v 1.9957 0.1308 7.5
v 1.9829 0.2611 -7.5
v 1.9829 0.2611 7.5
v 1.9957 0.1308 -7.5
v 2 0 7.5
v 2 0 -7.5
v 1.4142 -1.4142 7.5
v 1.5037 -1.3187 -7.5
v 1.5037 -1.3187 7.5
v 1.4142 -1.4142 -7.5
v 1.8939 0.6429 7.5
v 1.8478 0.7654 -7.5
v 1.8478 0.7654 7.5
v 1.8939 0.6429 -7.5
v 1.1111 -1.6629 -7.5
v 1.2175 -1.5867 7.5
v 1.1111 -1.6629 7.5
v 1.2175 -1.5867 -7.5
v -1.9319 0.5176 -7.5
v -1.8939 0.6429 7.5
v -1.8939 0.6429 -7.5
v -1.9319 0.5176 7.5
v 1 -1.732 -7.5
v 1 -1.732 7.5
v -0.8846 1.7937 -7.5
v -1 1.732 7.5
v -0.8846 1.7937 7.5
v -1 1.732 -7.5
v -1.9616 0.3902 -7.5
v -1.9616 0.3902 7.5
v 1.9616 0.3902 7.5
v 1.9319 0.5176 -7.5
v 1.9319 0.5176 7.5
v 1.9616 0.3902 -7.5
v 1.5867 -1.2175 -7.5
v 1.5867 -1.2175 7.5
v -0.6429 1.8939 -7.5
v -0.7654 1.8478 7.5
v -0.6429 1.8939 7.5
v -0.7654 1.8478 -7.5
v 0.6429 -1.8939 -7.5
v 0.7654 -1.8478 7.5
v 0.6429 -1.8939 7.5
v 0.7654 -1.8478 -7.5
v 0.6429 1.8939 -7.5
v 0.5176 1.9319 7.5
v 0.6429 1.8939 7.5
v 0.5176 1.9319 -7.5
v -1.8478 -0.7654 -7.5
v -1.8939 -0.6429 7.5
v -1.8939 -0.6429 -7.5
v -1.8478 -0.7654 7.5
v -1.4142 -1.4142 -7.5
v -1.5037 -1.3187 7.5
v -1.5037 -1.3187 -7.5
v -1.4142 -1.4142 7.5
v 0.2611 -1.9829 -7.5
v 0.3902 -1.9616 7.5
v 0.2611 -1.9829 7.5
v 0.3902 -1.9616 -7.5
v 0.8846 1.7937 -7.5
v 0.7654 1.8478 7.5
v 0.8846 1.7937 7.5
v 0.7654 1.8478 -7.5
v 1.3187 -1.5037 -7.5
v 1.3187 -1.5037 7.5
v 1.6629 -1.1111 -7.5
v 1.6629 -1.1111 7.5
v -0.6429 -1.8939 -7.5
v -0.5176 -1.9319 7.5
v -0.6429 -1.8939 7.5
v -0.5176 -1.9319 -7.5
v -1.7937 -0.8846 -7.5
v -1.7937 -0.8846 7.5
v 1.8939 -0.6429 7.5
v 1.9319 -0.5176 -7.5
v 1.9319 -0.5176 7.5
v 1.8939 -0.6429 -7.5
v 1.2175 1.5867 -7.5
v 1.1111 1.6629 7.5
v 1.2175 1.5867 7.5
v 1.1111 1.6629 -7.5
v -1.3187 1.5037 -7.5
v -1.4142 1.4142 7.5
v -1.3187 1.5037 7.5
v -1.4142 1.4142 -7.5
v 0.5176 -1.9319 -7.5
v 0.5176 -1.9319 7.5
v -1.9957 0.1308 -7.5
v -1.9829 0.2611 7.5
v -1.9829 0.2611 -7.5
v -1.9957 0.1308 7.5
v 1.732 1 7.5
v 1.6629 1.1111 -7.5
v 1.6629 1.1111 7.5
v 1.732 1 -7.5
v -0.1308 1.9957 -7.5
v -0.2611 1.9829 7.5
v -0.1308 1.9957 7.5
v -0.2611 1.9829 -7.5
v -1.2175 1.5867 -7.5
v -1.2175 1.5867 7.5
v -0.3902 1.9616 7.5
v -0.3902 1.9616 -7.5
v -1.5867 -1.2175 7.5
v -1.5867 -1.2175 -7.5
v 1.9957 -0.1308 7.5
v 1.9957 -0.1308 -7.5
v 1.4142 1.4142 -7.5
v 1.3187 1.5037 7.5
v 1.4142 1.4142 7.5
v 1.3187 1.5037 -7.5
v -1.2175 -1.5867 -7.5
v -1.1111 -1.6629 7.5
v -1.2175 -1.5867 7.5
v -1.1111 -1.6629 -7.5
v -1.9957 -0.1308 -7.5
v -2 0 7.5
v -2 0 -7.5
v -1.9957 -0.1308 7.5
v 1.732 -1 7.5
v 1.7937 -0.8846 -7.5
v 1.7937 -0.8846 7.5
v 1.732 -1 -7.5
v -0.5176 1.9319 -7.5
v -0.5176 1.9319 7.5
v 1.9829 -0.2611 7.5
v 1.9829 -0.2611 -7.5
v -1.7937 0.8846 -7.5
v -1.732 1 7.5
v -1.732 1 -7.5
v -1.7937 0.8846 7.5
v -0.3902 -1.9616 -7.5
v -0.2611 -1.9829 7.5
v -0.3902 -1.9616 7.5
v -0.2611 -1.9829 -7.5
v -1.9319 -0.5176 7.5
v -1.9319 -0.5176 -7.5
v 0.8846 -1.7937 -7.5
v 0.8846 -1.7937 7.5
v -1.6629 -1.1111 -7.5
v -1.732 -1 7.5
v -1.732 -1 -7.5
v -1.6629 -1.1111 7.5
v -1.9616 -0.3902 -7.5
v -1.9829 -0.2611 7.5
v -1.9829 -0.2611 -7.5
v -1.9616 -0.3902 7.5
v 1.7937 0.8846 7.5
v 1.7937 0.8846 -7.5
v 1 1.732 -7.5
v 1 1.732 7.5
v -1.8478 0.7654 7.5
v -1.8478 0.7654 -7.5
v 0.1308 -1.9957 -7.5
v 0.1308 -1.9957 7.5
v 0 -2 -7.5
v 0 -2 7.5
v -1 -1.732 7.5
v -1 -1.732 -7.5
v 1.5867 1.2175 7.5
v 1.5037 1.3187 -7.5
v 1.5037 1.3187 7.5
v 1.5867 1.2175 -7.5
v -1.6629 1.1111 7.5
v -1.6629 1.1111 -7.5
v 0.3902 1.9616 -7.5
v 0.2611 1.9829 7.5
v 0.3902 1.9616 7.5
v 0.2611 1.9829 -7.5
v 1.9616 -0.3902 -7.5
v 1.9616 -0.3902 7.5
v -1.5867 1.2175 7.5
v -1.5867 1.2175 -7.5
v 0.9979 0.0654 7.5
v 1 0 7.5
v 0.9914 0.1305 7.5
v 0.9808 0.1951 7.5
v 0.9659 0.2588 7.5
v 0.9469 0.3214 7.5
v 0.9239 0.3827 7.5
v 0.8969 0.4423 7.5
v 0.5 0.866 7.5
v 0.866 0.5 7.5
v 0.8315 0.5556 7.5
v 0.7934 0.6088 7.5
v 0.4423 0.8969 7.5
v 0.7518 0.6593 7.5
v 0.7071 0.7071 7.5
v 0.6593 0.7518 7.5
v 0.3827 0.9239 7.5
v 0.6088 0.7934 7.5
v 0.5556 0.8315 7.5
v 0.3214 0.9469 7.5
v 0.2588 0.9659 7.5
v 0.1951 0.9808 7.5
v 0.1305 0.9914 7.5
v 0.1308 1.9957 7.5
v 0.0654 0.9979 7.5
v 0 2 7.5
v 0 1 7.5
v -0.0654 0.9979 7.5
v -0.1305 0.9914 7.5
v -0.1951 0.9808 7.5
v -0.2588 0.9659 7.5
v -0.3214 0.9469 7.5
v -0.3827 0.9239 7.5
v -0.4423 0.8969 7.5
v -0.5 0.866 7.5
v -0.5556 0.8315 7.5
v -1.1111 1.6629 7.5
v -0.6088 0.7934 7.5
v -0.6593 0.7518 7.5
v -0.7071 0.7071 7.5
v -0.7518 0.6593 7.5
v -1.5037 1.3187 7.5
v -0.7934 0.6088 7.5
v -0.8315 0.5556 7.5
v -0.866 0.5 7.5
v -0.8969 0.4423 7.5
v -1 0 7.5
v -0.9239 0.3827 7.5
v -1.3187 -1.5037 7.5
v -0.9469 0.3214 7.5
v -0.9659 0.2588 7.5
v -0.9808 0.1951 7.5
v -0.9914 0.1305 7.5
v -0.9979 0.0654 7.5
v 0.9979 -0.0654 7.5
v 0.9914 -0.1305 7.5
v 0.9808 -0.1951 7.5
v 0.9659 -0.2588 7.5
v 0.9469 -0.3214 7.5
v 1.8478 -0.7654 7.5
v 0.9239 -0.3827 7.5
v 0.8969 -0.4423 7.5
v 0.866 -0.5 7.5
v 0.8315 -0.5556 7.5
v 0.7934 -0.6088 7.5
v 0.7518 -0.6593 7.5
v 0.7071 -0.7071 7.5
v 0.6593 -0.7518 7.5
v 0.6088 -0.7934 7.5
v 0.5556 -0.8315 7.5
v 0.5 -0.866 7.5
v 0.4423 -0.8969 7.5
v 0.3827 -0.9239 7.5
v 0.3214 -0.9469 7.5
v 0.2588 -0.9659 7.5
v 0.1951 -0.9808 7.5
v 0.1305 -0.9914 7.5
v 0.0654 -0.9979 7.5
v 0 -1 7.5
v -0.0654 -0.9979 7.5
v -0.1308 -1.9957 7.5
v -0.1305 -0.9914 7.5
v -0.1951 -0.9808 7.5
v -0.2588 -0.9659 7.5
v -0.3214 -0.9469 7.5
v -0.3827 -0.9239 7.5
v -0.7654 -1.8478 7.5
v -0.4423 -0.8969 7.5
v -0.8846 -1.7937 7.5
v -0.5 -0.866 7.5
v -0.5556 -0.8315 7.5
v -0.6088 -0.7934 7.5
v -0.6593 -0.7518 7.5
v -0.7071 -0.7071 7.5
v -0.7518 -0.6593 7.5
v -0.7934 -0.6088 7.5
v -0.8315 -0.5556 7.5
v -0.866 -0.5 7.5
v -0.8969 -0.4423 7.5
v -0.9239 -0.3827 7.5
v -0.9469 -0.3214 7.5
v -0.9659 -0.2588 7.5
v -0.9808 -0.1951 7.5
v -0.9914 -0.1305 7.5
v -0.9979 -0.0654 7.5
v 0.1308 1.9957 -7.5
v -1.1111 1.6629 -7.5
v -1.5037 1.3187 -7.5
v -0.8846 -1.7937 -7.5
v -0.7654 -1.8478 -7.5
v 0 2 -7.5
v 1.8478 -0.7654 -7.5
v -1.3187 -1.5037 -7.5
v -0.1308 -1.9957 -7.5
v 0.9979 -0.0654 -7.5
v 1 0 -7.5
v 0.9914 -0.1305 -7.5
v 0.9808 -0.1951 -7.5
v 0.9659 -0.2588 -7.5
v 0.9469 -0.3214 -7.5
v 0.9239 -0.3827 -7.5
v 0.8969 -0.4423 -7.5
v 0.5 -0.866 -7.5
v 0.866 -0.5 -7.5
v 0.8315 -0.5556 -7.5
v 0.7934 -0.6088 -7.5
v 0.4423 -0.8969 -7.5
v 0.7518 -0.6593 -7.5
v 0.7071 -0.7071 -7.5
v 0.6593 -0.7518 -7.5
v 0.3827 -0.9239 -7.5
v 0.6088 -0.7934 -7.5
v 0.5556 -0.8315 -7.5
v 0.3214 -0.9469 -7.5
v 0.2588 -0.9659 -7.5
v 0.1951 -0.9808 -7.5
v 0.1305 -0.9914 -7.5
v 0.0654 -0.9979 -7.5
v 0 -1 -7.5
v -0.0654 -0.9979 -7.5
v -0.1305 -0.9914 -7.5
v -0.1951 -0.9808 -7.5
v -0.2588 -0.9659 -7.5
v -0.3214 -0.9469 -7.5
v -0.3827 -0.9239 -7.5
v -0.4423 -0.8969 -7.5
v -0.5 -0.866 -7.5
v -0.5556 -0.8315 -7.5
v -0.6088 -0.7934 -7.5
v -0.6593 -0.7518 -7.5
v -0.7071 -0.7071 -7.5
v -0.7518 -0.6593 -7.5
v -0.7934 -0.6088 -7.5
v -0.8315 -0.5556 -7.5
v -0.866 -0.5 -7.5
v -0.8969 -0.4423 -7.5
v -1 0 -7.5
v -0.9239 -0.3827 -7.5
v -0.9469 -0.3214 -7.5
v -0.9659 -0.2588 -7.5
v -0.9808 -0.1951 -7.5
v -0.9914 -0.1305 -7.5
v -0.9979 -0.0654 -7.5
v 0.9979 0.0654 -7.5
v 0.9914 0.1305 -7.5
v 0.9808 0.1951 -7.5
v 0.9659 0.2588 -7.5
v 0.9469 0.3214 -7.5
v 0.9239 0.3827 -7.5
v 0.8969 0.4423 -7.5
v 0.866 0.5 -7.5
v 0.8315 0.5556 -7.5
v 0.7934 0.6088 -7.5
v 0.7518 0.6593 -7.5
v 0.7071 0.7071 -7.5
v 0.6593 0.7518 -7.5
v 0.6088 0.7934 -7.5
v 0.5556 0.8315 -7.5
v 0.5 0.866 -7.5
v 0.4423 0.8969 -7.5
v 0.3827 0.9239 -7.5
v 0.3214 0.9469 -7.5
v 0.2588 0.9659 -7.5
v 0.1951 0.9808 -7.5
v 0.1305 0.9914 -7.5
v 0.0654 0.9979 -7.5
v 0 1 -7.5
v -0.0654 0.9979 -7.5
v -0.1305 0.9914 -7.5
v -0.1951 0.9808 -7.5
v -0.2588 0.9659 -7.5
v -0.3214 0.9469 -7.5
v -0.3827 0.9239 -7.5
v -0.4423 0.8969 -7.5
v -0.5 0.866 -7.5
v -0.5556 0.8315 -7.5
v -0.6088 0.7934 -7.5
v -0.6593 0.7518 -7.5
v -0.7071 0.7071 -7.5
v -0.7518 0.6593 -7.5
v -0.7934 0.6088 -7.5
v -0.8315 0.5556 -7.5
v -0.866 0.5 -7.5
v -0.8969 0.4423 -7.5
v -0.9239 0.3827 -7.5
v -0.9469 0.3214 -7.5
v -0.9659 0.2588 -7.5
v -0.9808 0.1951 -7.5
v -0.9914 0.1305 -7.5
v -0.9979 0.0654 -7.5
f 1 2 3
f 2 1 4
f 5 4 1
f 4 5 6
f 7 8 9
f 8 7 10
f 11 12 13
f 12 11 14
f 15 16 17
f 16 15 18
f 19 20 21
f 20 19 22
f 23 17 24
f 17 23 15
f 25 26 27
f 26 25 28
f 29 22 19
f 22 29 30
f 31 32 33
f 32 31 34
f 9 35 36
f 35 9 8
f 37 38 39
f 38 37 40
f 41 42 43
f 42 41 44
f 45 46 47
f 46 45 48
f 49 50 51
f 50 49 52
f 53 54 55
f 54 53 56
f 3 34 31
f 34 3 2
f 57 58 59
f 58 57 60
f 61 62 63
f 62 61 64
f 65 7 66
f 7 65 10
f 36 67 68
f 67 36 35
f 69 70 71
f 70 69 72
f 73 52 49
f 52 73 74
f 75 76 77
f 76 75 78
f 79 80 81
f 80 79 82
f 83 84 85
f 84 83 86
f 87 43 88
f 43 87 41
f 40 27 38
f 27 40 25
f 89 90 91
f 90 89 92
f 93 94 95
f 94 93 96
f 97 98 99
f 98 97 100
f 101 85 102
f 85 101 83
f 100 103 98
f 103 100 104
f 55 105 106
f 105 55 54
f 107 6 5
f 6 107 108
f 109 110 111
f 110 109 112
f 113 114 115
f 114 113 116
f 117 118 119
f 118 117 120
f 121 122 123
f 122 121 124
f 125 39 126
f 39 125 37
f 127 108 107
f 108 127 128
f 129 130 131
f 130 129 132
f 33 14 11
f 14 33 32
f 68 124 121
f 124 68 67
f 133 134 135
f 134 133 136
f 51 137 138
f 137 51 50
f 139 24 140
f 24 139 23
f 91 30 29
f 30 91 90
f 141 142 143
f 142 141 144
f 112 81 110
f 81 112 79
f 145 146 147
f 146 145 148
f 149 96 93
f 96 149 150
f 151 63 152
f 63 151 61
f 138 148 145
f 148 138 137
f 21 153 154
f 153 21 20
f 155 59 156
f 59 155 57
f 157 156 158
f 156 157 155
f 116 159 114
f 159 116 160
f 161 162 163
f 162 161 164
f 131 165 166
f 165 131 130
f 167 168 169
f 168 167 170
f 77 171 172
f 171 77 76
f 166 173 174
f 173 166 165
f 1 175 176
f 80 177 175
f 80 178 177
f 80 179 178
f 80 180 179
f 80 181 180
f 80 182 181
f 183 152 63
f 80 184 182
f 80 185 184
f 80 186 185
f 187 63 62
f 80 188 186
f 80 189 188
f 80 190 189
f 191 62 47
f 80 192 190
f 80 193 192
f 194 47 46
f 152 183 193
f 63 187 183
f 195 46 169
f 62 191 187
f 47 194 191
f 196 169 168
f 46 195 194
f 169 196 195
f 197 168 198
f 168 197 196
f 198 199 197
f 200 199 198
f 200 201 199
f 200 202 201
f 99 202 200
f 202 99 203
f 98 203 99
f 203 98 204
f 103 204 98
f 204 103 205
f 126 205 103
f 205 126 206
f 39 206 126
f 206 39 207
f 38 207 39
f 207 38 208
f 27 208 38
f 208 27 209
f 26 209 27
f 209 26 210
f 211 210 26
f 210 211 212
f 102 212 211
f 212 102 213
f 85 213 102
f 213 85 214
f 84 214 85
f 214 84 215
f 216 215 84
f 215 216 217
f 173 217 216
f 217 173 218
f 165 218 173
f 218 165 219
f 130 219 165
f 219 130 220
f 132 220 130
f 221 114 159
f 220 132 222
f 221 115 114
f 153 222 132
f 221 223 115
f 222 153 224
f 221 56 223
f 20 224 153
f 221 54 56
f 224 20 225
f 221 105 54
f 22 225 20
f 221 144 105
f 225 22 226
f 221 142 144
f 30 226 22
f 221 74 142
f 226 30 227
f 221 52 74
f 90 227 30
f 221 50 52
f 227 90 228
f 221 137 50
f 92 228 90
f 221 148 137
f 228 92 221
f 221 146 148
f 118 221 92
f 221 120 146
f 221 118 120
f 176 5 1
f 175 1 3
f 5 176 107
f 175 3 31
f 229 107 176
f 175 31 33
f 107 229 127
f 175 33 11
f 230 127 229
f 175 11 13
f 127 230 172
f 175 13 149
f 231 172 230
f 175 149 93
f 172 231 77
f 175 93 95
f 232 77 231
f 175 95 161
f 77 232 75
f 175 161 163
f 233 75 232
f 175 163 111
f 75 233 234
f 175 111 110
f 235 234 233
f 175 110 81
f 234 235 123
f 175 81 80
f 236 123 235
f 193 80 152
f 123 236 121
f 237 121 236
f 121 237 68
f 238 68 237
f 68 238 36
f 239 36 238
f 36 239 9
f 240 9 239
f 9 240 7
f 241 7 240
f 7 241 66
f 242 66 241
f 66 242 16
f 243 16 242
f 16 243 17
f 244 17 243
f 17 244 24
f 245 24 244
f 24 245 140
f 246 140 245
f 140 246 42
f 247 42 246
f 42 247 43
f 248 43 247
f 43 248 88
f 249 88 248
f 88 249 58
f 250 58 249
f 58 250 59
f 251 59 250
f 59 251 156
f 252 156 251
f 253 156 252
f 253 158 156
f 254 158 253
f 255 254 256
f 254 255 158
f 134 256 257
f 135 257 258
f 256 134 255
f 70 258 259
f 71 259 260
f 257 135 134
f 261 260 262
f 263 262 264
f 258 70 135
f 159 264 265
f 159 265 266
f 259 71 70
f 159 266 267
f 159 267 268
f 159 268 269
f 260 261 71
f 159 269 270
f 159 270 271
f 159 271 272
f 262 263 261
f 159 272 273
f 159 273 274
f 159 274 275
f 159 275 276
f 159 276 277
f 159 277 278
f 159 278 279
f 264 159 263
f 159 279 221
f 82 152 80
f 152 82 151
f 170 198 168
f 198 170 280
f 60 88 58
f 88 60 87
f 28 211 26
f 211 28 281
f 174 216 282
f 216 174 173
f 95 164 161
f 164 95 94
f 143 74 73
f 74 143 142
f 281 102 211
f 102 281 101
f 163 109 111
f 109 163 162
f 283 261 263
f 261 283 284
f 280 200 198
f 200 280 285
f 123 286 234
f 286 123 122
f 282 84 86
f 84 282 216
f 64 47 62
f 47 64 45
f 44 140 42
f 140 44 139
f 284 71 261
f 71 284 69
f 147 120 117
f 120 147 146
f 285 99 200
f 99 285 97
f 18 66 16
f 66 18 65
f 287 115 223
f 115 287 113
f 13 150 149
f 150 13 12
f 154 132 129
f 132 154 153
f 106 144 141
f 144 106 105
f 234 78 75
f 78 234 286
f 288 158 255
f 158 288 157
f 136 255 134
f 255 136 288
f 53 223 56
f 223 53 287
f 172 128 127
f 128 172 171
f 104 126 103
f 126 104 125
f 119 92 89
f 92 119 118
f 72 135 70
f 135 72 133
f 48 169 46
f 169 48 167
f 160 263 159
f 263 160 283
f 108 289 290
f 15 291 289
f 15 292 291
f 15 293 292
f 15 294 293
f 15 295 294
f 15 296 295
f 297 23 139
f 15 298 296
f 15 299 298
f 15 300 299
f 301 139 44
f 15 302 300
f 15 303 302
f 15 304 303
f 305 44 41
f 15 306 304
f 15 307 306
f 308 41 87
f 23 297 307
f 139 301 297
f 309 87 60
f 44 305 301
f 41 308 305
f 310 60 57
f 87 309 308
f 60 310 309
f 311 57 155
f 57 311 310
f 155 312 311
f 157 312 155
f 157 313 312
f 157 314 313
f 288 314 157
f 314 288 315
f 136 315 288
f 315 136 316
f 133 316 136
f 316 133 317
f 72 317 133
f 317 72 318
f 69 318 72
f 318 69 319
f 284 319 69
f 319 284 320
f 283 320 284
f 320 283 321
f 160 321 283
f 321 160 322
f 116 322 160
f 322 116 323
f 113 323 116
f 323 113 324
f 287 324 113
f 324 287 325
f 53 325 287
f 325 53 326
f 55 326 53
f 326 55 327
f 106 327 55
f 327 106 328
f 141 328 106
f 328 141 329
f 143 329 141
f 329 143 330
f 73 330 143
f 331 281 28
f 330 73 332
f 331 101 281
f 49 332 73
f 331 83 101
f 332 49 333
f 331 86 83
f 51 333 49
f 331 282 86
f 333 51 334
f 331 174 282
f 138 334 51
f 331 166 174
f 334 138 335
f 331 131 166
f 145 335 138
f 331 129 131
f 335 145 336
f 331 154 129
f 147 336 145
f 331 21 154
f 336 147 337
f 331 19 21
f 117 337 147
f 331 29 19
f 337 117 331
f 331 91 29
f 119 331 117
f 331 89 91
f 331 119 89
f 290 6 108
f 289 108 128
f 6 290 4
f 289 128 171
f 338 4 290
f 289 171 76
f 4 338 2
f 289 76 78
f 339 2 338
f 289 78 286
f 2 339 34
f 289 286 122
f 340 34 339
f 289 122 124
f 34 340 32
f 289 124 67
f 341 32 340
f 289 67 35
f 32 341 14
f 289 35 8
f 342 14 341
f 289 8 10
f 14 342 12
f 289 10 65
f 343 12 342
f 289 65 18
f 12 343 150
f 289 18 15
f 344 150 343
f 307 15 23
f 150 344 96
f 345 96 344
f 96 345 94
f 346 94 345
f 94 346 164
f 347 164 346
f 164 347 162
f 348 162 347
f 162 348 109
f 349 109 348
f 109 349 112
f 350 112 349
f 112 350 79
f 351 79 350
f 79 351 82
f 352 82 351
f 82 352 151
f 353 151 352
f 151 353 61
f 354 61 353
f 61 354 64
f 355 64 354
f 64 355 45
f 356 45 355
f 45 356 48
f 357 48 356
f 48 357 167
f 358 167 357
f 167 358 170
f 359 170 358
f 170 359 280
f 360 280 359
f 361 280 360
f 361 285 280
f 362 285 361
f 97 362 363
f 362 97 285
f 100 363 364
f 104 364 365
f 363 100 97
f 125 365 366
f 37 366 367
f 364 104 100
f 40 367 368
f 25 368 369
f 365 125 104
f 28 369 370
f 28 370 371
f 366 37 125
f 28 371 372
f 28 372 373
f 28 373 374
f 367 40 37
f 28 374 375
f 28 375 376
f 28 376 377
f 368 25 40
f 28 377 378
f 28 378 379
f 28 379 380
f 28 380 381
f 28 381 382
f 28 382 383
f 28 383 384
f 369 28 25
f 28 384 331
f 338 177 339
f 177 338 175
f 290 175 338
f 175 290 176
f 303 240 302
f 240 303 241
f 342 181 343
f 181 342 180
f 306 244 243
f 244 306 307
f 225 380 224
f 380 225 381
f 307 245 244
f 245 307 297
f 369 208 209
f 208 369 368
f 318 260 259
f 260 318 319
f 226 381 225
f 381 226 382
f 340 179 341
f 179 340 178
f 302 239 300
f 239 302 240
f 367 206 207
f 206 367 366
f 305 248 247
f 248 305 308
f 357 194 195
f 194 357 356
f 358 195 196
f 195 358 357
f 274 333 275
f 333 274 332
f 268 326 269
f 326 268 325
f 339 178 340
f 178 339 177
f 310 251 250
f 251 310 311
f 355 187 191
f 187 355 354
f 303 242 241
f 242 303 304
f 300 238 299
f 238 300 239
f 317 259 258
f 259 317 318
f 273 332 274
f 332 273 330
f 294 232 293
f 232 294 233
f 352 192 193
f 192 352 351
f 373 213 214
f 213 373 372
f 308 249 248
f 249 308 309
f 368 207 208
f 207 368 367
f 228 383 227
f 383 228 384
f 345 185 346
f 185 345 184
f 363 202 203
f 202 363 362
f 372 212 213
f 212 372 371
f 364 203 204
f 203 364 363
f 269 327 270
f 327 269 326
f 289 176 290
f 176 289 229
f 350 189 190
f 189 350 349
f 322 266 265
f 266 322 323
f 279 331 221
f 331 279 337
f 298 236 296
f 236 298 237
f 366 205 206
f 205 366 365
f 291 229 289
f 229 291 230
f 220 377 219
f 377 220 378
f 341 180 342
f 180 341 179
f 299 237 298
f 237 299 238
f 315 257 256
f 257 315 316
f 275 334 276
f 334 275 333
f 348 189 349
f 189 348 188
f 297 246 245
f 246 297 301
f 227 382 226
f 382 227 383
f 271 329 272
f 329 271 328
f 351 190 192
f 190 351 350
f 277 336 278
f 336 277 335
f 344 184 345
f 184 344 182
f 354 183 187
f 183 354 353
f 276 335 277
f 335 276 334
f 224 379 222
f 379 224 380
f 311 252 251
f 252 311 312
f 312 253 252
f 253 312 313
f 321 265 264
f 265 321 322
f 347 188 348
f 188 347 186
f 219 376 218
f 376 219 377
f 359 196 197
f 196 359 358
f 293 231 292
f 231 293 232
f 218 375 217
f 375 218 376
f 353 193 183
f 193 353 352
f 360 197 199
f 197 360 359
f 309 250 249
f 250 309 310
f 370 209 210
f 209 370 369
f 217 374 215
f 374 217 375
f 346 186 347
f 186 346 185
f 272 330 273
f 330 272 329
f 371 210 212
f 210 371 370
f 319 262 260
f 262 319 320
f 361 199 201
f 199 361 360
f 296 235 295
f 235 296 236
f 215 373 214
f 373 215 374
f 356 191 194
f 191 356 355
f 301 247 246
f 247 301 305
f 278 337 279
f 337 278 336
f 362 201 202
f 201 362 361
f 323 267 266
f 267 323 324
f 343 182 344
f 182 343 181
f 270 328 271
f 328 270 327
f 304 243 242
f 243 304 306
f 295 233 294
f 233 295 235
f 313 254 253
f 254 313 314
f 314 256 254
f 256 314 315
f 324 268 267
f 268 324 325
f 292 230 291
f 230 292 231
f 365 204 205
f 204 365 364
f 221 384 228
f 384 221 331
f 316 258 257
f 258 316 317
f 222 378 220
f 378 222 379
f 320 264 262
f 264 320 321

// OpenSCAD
// PTFE sleeving (tubing) - robust, non-empty geometry

length = 15; //[8:30:1]
outer_diameter = 4; //[2:8:0.1]
inner_diameter_nominal = 2; //[1:6:0.1]
forced_id = 0; //[0:6:0.1]
center = true; //[0:1:1]
overlap = 0.8; //[0.5:2:0.1]

$fn = 96;

module tubing() {
    od = max(outer_diameter, 0.01);
    id_req = (forced_id > 0) ? forced_id : inner_diameter_nominal;

    // Keep a guaranteed wall thickness so the tube never collapses to empty
    min_wall = 0.25;                 // mm
    id = min(max(id_req, 0), max(0, od - 2*min_wall));

    h = max(length, 0.01);

    // Ensure the inner cutter fully passes through regardless of centering
    z_shift = center ? 0 : -overlap;

    color([0.85, 0.85, 0.8])  // PTFE color
    difference() {
        cylinder(h=h, r=od/2, center=center);
        translate([0, 0, z_shift])
            cylinder(h=h + 2*overlap, r=id/2, center=center);
    }
}

tubing();
